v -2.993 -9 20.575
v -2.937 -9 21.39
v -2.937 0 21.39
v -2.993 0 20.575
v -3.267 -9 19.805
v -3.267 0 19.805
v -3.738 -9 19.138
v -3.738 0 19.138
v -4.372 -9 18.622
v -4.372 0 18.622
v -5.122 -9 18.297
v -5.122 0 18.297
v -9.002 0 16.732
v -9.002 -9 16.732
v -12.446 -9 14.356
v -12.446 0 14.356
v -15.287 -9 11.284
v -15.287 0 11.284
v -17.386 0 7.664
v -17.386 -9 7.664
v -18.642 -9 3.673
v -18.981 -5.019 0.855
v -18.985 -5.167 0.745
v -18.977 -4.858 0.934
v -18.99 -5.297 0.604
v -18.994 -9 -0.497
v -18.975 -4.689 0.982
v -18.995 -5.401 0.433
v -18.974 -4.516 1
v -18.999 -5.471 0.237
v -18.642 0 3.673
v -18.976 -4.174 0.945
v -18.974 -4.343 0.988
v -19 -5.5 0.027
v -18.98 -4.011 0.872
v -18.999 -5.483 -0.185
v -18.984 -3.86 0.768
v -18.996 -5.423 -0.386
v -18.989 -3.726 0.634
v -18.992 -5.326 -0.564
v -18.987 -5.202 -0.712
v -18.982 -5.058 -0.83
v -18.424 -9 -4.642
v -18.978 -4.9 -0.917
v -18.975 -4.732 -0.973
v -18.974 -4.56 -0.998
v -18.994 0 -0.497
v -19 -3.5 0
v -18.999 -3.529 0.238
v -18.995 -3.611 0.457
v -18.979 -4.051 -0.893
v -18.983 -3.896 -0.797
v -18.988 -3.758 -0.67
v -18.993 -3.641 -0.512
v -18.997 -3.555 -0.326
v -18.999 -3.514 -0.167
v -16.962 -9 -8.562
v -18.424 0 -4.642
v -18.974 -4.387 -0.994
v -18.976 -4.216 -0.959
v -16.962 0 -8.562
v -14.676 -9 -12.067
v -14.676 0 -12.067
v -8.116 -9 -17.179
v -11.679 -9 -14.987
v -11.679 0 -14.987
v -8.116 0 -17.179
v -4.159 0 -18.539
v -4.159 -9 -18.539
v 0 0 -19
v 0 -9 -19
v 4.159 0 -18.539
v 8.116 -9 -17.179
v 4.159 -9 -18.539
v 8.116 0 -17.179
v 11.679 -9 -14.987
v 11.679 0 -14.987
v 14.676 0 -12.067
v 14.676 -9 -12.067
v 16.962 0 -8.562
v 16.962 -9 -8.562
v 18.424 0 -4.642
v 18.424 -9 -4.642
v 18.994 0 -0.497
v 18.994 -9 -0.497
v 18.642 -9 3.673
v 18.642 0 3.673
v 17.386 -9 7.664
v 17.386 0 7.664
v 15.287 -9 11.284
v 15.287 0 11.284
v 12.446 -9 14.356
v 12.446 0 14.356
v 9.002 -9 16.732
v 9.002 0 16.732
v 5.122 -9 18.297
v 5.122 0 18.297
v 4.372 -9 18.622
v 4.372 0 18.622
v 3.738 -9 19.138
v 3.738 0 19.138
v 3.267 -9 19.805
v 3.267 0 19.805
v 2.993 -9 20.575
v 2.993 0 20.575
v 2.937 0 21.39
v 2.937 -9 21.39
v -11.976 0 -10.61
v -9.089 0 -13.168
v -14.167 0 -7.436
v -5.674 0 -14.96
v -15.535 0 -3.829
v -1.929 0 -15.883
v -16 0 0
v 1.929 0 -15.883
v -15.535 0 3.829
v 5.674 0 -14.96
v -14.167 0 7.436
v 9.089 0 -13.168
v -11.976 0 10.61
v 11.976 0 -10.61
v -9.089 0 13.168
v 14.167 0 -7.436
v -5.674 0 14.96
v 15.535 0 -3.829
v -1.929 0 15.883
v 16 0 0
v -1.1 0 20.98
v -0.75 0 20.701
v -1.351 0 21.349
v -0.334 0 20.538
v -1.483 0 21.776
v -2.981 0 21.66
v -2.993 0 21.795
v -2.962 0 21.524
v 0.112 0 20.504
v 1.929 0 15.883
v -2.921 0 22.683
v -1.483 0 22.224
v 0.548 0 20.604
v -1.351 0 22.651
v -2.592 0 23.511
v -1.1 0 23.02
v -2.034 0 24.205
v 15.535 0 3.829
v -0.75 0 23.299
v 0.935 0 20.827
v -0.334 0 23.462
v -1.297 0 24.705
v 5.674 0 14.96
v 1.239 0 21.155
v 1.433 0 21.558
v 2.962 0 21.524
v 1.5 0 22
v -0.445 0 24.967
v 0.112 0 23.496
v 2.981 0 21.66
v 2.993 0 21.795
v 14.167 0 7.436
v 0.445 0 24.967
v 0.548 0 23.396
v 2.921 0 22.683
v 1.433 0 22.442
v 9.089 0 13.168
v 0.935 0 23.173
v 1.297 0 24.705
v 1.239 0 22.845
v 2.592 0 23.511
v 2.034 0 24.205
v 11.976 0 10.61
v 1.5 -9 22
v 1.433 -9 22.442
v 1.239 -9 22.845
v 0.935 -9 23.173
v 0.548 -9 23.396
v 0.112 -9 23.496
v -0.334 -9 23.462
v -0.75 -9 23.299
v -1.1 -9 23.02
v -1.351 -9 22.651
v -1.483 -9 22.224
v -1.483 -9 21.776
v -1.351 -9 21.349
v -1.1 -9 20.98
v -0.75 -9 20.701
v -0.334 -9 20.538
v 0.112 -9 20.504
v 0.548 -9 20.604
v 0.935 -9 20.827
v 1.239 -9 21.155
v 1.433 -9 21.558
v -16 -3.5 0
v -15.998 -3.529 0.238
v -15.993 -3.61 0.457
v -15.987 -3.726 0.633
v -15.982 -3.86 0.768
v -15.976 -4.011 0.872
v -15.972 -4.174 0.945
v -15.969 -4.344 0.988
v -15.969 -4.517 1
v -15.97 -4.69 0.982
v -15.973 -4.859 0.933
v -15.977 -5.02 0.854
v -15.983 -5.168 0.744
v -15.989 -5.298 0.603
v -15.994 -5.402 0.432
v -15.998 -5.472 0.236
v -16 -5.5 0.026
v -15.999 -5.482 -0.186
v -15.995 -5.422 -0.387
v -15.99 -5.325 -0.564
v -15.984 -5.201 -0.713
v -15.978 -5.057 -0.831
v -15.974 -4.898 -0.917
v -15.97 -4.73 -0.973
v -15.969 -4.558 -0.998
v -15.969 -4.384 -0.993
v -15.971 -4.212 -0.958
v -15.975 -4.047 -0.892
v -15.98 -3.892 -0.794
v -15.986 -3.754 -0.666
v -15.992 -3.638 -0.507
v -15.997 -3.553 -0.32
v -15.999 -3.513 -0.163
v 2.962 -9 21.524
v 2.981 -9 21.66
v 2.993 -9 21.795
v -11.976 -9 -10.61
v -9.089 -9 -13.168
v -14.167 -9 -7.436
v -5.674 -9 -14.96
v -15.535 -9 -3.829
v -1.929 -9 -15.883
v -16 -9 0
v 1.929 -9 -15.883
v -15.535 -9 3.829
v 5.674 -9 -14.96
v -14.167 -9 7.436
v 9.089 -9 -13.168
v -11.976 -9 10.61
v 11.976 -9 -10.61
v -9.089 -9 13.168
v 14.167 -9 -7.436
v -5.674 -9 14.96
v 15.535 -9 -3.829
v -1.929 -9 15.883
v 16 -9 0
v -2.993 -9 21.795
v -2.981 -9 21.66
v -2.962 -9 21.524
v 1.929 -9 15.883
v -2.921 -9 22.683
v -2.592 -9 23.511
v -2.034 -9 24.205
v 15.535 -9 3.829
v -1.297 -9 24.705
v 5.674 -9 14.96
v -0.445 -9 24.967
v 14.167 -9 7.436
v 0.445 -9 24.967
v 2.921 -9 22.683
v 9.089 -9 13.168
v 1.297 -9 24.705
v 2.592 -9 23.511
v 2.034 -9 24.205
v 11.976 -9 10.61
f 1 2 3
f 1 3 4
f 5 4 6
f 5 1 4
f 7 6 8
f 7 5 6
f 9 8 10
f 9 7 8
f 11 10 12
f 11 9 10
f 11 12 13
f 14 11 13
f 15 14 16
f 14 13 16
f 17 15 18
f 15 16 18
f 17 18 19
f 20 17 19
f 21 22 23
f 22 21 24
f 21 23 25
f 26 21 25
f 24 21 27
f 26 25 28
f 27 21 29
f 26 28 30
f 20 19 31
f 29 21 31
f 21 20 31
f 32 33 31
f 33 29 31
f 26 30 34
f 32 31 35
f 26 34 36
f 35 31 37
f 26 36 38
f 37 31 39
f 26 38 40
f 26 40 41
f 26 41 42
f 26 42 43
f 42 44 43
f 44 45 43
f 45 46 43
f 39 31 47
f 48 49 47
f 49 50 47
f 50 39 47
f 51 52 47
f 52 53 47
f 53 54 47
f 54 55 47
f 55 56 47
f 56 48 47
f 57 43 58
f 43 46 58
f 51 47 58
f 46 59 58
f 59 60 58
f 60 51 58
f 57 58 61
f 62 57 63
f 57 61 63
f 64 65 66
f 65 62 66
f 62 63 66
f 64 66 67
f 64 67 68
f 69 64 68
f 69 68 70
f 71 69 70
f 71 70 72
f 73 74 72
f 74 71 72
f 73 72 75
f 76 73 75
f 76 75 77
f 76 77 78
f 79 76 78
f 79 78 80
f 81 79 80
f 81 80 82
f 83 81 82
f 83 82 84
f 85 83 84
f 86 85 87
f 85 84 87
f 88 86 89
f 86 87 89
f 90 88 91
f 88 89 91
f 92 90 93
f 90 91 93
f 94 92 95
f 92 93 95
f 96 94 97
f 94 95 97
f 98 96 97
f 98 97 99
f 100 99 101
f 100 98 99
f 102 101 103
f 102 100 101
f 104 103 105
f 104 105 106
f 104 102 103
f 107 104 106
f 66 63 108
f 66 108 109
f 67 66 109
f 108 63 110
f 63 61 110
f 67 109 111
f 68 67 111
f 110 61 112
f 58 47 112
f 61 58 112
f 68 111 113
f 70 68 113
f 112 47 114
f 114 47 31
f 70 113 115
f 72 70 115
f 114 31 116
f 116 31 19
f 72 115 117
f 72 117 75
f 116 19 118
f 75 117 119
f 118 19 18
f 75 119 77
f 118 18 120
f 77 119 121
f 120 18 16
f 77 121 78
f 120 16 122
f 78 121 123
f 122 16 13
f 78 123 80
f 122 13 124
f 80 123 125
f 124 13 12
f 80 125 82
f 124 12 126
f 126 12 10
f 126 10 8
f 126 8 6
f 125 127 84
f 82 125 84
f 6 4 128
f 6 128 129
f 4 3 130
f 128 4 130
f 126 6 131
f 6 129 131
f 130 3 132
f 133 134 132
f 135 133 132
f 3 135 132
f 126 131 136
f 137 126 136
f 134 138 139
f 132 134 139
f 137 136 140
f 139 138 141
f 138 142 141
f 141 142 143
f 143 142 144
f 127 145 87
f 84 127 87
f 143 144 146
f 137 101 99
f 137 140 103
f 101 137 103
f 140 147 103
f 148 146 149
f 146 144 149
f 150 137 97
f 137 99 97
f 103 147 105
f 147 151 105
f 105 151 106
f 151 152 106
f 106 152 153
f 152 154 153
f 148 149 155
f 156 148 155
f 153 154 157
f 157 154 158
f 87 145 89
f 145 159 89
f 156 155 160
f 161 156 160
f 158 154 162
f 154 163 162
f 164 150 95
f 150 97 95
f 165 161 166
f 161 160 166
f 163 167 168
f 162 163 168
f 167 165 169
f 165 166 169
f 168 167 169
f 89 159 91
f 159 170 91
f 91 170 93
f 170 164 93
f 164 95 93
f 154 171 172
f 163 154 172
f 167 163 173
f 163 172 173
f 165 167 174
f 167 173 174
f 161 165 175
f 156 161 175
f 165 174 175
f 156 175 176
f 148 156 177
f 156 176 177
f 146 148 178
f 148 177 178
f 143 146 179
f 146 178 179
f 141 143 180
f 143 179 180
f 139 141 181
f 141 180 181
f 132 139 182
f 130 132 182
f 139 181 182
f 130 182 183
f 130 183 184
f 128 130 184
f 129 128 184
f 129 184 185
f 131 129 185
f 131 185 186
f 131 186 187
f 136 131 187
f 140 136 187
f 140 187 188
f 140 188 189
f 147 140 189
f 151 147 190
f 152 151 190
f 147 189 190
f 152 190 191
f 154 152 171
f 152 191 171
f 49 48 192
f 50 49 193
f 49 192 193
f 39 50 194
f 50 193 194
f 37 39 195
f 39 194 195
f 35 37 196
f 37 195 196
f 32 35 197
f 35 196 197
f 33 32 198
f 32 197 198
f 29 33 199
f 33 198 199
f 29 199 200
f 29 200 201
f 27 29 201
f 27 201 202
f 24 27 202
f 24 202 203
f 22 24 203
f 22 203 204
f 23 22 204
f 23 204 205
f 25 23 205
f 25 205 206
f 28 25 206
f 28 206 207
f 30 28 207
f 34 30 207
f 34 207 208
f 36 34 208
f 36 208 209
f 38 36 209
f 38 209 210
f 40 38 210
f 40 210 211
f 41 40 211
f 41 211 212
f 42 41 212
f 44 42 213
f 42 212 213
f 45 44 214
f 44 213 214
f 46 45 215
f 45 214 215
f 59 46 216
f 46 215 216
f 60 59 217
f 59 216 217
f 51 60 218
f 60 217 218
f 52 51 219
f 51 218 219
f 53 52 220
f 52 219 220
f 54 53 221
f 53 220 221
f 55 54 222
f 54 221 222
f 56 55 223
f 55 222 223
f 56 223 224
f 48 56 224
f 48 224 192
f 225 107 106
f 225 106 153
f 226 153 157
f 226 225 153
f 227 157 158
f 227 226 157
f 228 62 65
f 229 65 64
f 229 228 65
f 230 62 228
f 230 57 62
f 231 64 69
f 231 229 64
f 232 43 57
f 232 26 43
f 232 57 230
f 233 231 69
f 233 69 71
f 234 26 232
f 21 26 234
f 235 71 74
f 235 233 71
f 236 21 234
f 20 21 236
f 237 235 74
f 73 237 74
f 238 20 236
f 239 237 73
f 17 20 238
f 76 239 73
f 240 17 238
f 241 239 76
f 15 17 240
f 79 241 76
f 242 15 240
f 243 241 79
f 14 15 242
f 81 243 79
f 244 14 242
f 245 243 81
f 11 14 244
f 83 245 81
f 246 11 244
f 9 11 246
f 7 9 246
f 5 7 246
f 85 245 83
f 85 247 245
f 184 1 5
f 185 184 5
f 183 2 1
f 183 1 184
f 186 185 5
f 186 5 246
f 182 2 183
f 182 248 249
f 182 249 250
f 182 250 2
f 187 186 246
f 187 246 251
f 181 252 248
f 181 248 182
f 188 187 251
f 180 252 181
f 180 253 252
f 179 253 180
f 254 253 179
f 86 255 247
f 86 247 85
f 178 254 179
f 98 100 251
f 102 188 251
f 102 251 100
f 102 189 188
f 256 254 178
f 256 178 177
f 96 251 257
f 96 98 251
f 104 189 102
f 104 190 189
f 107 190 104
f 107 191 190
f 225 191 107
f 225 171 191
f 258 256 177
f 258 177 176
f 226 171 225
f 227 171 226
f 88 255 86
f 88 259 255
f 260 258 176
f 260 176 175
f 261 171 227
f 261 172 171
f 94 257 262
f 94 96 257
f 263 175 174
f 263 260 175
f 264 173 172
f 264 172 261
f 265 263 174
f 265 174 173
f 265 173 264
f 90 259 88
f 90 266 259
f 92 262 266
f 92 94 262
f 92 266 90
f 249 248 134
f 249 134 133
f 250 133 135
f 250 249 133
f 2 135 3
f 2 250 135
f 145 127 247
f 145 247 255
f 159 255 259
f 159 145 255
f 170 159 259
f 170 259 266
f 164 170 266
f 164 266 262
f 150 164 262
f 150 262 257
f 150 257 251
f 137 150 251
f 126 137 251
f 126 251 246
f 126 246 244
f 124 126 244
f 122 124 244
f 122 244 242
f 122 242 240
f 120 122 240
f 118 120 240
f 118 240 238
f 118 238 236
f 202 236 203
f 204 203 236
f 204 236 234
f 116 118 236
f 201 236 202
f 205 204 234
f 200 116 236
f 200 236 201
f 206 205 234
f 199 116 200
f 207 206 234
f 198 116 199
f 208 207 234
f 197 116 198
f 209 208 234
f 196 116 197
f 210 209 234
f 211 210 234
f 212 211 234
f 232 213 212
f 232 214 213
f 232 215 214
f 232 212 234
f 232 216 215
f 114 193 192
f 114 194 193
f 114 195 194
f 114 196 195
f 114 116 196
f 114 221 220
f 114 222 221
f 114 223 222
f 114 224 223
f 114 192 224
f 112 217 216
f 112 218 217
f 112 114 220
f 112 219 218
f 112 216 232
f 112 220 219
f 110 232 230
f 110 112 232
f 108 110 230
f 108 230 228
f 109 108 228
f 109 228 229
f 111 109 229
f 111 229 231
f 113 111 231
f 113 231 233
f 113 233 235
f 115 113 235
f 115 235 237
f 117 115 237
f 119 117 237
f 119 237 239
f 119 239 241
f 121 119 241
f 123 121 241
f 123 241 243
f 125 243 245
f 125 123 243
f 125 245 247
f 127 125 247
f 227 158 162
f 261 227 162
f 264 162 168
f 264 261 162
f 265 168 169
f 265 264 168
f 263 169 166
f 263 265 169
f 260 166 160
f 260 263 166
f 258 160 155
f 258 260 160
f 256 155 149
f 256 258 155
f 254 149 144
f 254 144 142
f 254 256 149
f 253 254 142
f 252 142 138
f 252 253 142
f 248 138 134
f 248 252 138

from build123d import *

# Parameters (mm, degrees)
F0_R     = 19
F0_R_2   = 16
F1_DEPTH = 9
F4_R     = 3
F5_DEPTH = 19.001
F6_R     = 1.5
F7_DEPTH = 9
F9_D     = 2
F9_DEPTH = 50
F9_TIP   = 0.600860619


with BuildPart() as f1:
    # F0 (on Front) → F1 (new body)
    with BuildSketch(Plane.XZ):
        Circle(F0_R)
        Circle(F0_R_2, mode=Mode.SUBTRACT)
    extrude(amount=F1_DEPTH)

    # F4 (on Right) → F5 (cut, through all)
    with BuildSketch(Plane.YZ):
        with Locations((-18, 0)):
            Circle(F4_R)
    extrude(amount=-F5_DEPTH, mode=Mode.SUBTRACT)

    # F6 (on face) → F7 (join)
    with BuildSketch(Plane.XZ.offset(9)):
        with BuildLine():
            ThreePointArc((-2.937363317, 21.3901670932), (-3.479735084, 19.4552086117), (-5.1216935171, 18.2966733456))
            ThreePointArc((-5.1216935171, 18.2966733456), (0, 19), (5.1216935171, 18.2966733456))
            ThreePointArc((5.1216935171, 18.2966733456), (3.479735084, 19.4552086117), (2.937363317, 21.3901670932))
            ThreePointArc((2.937363317, 21.3901670932), (2.9582746132, 21.5937605423), (2.993018618, 21.7954544414))
            ThreePointArc((2.993018618, 21.7954544414), (0, 24.9999997616), (-2.993018618, 21.7954544414))
            ThreePointArc((-2.993018618, 21.7954544414), (-2.9582746132, 21.5937605423), (-2.937363317, 21.3901670932))
        make_face()
        with Locations((0, 21.9999998808)):
            Circle(F6_R, mode=Mode.SUBTRACT)
        with BuildLine():
            ThreePointArc((-2.993018618, 21.7954544414), (-2.9721073218, 21.5918609923), (-2.937363317, 21.3901670932))
            ThreePointArc((-2.937363317, 21.3901670932), (-2.9582746132, 21.5937605423), (-2.993018618, 21.7954544414))
        make_face()
        with BuildLine():
            ThreePointArc((2.993018618, 21.7954544414), (2.9582746132, 21.5937605423), (2.937363317, 21.3901670932))
            ThreePointArc((2.937363317, 21.3901670932), (2.9721073218, 21.5918609923), (2.993018618, 21.7954544414))
        make_face()
    extrude(amount=-F7_DEPTH)

    # F9 (one way)
    with BuildSketch(Plane.YZ):
        with Locations((-4.5, 0)):
            Circle(F9_D / 2)
    extrude(amount=-F9_DEPTH, mode=Mode.SUBTRACT)
    with Locations(Plane.YZ):
        with Locations((-4.5, 0)):
            with Locations((0, 0, -(F9_DEPTH + F9_TIP / 2))):  # 118° drill point
                Cone(0, F9_D / 2, F9_TIP, mode=Mode.SUBTRACT)


solid = f1.part
